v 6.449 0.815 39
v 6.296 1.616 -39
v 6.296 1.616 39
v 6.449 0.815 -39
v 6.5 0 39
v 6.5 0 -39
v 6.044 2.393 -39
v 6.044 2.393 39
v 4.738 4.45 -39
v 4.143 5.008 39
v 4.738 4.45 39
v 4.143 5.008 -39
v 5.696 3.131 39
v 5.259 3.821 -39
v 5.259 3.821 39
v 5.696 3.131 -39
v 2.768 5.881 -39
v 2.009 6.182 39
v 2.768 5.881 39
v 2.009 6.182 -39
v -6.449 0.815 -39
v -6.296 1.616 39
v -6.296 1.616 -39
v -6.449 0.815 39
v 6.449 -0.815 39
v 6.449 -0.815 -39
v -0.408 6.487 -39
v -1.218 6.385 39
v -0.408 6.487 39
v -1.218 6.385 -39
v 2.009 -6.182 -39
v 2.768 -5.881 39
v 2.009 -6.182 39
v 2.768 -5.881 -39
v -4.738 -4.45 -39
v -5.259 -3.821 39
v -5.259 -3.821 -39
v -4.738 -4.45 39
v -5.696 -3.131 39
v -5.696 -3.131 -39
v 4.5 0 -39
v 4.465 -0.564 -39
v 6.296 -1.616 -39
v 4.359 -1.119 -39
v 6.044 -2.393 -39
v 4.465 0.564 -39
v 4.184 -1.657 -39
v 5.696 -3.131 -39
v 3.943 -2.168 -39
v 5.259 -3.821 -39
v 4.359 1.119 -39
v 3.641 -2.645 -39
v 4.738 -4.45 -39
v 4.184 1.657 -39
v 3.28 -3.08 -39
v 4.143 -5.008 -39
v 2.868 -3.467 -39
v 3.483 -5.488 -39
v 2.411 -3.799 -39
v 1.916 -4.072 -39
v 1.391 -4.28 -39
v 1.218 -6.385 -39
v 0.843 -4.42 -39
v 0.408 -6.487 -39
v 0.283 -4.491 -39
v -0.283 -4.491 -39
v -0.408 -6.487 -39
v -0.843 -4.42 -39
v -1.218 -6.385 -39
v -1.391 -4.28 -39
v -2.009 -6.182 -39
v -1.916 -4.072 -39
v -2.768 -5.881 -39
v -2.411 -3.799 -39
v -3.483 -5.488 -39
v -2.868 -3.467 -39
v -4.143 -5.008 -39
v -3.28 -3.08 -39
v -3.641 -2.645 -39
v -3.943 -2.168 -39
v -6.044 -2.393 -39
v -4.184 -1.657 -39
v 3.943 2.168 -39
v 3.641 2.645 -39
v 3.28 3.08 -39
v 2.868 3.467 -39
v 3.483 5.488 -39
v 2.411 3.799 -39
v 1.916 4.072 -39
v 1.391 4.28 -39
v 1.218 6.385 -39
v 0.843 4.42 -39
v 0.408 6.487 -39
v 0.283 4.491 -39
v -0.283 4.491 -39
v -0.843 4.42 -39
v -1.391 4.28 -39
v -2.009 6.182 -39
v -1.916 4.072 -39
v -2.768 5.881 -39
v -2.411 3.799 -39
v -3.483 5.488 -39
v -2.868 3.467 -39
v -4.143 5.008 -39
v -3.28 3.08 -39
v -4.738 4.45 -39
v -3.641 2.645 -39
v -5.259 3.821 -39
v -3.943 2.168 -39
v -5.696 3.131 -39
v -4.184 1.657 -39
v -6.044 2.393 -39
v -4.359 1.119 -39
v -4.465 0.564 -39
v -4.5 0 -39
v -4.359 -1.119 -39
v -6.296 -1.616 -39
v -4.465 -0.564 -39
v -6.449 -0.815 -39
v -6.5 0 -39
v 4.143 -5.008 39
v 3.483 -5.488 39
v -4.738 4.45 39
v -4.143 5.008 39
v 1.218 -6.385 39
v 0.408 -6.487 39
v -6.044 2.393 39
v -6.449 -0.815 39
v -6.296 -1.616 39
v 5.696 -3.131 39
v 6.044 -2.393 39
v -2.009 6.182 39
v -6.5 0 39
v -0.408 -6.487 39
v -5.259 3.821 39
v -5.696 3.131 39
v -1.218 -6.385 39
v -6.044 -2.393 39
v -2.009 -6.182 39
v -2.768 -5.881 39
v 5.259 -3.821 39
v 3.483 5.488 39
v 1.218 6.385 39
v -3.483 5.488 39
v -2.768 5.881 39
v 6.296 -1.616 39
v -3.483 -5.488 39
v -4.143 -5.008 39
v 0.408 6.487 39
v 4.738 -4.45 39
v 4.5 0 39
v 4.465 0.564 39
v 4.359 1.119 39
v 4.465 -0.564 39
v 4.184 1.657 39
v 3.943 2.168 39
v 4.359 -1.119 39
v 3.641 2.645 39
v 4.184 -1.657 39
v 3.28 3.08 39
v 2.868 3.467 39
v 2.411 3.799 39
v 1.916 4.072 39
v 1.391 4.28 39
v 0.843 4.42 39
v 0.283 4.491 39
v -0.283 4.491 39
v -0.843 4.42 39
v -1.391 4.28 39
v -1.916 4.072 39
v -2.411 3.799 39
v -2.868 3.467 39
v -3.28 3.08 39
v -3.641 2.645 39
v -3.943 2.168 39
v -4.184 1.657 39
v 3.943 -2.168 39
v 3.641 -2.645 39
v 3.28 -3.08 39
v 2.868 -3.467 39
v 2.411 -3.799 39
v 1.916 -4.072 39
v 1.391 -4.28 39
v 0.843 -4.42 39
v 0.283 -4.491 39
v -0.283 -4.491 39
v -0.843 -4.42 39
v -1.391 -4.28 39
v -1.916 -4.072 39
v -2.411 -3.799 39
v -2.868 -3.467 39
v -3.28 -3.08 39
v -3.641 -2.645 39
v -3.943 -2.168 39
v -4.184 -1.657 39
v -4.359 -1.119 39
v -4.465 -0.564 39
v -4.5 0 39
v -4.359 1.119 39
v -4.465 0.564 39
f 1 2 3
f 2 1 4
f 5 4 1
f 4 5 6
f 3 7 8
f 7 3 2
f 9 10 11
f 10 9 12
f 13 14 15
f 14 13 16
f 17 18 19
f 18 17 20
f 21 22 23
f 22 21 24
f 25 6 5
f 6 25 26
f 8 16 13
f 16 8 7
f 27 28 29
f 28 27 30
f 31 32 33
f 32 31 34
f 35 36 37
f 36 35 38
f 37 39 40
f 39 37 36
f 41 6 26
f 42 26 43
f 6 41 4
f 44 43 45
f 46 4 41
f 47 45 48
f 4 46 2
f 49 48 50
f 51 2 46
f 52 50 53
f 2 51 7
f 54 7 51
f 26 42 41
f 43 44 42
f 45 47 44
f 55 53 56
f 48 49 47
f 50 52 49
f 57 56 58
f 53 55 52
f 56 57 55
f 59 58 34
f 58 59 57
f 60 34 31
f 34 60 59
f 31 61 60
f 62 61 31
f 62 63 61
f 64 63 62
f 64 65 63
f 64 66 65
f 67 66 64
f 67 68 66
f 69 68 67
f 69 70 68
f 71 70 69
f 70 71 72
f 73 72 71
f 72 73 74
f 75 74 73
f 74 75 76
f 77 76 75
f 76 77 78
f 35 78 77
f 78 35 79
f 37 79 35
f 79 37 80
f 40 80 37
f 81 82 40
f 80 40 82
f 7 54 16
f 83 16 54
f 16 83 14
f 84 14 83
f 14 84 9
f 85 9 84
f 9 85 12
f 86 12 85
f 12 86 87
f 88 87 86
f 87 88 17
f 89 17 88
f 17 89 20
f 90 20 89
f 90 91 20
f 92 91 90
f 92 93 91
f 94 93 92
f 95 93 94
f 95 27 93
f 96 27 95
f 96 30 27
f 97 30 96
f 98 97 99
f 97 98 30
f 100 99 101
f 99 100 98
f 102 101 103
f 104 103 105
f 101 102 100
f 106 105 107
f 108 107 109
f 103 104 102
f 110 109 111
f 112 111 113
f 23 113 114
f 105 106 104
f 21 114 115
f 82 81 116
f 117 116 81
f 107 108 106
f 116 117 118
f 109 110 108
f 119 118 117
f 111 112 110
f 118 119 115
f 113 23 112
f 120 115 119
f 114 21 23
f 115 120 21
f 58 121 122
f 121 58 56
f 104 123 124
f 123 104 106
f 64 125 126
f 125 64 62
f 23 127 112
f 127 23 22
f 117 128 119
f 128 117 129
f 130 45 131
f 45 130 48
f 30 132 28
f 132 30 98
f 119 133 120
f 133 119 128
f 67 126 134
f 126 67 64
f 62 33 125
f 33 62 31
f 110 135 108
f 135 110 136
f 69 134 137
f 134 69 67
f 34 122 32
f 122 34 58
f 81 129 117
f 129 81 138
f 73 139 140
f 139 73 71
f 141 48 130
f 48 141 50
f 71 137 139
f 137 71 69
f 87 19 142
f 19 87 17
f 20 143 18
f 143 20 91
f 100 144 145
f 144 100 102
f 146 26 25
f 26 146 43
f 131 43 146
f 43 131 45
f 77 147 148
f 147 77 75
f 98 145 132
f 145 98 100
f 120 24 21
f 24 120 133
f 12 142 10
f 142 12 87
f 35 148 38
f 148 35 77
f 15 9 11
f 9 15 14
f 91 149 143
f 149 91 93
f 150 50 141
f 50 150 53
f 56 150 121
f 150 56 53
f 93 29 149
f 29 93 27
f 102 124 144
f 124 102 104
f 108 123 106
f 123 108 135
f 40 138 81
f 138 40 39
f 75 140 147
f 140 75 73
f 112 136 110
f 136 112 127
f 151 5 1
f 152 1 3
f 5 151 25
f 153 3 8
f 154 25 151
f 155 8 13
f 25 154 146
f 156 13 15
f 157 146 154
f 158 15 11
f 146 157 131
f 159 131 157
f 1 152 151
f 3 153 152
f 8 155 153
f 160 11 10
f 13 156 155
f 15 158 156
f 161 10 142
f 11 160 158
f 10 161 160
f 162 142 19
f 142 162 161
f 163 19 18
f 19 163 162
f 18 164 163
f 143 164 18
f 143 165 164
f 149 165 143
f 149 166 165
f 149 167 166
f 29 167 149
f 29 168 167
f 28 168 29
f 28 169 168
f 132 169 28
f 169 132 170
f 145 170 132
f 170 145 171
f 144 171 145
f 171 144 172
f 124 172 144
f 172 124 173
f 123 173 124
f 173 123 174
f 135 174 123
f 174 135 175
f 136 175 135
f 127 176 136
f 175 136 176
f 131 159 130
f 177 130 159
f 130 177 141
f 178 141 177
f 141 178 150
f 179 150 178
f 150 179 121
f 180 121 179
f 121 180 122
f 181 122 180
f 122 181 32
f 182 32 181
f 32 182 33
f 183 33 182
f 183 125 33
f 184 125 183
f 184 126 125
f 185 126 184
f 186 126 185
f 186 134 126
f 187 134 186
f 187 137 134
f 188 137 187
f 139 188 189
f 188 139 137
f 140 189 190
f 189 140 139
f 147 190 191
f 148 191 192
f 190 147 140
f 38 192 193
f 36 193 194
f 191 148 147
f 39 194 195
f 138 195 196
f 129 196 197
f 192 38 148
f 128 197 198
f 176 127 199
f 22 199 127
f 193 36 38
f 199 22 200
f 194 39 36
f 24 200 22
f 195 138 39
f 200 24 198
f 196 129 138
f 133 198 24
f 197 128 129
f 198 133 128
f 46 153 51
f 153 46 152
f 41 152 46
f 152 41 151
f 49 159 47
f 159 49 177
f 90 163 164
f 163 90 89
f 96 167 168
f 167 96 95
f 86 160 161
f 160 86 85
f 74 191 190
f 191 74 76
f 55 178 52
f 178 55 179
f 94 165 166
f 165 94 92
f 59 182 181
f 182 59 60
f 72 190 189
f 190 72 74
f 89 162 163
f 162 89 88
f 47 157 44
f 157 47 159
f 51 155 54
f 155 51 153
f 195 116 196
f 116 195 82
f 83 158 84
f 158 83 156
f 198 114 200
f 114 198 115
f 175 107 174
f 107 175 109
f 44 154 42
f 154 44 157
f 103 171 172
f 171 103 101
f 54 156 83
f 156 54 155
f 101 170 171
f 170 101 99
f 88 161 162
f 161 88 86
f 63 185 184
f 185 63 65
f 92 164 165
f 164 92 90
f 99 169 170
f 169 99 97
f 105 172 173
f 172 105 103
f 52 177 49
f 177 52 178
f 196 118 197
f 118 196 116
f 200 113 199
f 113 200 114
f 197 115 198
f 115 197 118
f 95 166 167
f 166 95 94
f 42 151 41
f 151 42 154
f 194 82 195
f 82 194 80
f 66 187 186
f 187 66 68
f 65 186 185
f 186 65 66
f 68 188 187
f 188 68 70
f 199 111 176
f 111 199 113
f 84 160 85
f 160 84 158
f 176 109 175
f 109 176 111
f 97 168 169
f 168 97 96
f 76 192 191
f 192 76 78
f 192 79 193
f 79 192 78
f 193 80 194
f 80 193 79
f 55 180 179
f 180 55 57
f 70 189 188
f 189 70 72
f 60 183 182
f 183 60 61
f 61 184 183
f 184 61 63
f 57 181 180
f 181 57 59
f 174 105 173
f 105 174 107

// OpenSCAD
$fn = 50;


difference() {
	union() {
		translate(v = [0, 0, -39.0000000000]) {
			cylinder(h = 78, r = 6.5000000000);
		}
	}
	union() {
		translate(v = [0, 0, -100.0000000000]) {
			cylinder(h = 200, r = 4.5000000000);
		}
	}
}
